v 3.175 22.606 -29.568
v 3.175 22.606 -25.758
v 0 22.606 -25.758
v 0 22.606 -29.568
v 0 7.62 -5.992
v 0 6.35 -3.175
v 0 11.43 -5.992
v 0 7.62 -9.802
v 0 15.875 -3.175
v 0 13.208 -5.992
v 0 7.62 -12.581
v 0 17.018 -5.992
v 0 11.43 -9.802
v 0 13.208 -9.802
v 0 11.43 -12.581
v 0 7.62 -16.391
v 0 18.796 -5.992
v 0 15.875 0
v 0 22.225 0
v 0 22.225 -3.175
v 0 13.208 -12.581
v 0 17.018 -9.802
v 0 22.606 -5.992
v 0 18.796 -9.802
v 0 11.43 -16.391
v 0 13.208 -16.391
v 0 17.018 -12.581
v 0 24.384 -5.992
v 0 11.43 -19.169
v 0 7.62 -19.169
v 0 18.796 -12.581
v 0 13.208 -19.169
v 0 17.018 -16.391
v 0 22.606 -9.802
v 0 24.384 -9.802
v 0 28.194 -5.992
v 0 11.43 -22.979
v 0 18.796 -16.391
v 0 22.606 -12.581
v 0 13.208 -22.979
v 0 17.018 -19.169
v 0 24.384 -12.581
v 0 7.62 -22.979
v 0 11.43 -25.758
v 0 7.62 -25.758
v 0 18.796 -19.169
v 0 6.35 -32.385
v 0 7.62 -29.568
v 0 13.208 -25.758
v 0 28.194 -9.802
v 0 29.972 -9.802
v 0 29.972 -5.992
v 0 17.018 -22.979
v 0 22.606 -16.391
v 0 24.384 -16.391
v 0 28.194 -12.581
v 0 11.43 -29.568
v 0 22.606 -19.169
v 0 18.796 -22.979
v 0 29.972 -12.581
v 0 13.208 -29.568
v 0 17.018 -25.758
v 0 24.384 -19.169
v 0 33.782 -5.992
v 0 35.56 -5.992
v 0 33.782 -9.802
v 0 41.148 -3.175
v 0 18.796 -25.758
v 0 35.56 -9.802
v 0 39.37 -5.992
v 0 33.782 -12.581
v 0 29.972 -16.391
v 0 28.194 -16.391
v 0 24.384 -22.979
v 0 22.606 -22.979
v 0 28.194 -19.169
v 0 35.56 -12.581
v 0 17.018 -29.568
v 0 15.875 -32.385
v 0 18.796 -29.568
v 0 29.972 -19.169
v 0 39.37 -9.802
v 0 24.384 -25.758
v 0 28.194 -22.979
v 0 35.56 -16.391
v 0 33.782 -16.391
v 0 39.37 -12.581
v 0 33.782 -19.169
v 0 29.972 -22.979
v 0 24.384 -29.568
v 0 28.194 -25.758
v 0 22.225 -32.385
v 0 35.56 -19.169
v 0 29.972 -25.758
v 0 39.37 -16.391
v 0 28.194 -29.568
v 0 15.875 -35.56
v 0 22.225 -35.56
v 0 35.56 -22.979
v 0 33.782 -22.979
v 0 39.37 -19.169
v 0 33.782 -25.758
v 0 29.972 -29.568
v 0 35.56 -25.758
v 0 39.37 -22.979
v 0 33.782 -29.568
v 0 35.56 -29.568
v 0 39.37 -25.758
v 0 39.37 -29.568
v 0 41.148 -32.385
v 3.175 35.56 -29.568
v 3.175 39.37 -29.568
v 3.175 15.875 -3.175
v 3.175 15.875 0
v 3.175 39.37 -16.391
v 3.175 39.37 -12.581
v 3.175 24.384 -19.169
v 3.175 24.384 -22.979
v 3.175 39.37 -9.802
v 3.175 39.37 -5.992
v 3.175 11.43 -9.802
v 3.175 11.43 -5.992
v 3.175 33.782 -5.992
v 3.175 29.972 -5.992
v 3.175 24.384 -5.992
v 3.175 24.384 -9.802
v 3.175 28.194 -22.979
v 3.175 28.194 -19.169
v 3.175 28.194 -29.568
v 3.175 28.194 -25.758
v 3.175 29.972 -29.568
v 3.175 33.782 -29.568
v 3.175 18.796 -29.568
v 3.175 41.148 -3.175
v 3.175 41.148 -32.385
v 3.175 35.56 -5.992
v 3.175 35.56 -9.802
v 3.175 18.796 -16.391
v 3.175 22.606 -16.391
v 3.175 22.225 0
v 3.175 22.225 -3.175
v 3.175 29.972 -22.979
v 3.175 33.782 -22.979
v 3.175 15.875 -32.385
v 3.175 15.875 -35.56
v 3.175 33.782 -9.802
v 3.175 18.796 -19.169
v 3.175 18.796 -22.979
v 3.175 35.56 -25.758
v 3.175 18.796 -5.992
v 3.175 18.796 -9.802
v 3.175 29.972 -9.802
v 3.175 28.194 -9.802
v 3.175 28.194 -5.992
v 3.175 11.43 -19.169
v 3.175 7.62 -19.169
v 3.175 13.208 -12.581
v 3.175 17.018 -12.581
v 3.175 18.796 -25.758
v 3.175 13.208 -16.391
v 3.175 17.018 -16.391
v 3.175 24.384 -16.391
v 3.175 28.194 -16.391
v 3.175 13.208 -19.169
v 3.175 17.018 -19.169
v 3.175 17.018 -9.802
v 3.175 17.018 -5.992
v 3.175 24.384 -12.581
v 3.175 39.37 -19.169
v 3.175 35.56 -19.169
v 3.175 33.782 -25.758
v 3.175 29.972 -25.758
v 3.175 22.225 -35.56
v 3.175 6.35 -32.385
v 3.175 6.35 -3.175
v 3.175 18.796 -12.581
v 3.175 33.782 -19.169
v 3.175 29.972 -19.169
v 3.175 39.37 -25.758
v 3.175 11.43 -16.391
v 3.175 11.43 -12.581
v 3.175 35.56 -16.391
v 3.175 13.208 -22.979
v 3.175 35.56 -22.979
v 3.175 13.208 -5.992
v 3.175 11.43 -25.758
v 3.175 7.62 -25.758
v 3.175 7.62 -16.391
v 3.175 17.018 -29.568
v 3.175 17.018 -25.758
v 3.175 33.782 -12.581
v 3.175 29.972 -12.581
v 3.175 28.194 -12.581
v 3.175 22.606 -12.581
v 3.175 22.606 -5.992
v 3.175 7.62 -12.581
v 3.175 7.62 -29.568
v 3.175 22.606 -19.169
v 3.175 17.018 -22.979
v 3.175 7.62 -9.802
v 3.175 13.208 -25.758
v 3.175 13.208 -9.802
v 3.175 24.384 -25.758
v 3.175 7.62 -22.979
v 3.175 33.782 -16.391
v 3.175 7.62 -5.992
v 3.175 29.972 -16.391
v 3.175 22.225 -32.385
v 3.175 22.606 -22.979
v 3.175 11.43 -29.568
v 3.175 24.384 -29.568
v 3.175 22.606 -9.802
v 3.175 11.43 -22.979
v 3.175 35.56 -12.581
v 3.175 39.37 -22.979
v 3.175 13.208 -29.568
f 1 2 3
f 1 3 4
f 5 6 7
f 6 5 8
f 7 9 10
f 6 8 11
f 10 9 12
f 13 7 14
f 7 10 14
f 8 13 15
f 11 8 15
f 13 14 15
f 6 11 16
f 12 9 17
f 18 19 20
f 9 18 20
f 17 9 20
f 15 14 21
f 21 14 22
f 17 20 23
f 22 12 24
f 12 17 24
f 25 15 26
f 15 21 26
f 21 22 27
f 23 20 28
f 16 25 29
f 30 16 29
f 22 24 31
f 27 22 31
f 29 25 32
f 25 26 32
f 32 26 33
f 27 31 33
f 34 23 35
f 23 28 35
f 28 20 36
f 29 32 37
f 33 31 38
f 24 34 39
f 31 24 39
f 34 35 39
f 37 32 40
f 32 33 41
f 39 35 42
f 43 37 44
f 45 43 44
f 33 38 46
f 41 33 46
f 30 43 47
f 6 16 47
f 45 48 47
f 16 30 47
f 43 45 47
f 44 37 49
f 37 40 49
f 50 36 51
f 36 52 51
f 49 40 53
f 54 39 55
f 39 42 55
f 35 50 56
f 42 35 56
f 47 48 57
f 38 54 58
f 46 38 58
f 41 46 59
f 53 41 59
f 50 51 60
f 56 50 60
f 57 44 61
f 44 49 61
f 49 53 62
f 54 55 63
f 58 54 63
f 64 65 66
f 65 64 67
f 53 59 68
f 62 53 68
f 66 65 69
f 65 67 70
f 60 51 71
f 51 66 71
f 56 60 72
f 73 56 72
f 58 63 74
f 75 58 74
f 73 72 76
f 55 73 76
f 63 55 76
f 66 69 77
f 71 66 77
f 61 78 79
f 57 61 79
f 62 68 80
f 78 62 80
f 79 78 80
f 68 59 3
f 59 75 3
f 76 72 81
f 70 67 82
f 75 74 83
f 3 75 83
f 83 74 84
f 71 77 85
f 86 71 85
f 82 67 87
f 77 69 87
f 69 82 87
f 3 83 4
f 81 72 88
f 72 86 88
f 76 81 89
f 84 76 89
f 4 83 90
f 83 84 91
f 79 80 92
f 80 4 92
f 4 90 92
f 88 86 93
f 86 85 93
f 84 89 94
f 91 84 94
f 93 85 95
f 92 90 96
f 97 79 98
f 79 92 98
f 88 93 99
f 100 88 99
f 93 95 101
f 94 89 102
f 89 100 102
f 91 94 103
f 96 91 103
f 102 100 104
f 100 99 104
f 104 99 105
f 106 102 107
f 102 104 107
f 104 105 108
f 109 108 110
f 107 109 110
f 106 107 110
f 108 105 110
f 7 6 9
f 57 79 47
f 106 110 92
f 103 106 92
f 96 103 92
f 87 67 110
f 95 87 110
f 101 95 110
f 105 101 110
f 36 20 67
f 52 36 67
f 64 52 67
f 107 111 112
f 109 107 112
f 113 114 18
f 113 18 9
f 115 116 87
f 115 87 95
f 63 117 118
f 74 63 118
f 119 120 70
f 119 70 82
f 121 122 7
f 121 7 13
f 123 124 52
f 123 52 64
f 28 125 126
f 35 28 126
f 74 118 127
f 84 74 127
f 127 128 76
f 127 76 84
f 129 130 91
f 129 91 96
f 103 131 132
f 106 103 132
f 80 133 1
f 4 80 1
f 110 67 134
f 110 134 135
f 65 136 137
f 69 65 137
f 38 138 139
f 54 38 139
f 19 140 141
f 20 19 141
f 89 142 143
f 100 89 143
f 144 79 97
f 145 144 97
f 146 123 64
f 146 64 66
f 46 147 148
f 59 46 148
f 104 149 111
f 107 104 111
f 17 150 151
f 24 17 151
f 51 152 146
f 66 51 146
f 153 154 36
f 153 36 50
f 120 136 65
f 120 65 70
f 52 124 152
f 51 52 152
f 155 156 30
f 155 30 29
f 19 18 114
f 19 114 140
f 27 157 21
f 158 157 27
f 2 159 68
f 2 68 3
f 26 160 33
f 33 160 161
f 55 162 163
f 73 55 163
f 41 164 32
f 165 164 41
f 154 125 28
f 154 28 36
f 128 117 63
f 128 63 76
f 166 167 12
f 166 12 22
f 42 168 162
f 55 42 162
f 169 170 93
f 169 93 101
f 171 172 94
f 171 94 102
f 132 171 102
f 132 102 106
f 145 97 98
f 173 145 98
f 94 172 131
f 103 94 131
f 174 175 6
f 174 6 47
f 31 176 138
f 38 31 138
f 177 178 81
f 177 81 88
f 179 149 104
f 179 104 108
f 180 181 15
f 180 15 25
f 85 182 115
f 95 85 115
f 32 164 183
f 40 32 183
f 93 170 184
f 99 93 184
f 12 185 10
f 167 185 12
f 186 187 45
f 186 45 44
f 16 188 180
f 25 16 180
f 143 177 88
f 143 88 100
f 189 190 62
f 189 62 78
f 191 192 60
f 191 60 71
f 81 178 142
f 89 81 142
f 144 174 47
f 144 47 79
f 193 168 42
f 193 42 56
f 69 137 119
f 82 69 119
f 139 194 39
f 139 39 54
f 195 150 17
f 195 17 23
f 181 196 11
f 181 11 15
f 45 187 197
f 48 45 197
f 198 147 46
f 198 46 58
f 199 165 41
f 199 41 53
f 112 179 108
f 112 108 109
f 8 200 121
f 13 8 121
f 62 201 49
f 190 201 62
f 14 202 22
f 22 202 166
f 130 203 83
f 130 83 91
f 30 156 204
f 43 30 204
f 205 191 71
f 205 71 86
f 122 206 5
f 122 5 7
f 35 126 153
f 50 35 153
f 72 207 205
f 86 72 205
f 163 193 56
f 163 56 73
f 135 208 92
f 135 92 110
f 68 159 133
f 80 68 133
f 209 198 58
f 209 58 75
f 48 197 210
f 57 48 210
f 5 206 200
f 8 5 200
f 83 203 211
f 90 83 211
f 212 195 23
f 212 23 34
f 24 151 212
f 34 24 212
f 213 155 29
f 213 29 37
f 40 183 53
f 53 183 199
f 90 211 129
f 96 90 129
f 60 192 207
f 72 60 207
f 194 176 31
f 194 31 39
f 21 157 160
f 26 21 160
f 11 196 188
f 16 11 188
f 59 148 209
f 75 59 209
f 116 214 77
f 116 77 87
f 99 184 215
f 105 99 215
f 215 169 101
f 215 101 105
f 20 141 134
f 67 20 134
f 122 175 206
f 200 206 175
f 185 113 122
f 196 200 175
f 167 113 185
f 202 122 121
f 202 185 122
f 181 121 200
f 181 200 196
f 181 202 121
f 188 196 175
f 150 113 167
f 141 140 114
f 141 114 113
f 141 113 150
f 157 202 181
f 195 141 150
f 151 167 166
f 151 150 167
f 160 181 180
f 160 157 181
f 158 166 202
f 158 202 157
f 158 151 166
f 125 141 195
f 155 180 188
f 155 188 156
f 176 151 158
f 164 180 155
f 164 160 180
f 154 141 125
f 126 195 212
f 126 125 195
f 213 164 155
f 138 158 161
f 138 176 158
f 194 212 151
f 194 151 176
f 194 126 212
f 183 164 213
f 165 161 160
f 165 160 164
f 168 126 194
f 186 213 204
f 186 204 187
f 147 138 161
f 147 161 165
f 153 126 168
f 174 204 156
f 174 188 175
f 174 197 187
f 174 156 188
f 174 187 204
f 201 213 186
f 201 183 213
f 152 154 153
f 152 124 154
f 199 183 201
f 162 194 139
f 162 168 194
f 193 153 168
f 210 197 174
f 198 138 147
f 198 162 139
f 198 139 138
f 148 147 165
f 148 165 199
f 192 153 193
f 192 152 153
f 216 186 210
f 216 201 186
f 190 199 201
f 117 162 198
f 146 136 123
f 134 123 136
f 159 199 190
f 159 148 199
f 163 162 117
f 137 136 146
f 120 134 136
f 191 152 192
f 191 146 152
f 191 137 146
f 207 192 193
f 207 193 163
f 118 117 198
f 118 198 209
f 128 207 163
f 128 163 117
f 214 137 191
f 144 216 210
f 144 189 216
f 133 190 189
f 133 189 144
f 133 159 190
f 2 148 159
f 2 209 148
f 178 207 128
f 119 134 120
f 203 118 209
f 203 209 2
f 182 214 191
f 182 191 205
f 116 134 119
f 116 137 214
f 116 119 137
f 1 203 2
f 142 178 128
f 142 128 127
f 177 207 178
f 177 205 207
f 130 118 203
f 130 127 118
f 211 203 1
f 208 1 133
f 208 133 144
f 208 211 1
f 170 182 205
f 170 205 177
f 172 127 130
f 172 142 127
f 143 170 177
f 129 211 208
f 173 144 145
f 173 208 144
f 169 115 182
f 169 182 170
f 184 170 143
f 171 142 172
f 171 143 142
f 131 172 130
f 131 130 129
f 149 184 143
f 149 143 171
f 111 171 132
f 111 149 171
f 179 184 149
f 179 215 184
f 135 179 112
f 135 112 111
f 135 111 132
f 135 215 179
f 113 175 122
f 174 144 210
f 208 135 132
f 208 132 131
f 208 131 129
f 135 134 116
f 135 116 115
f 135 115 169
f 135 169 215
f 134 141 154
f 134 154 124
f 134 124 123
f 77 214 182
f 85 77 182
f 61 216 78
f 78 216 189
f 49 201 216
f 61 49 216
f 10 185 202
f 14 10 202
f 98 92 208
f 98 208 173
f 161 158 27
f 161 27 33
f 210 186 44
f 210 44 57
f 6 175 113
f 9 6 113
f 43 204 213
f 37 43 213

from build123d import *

# Parameters (mm, degrees)
SKETCH1_W          = 35.56
SKETCH1_H          = 41.148
EXTRUDE1_DEPTH     = 3.175
SKETCH2_W          = 3.175
SKETCH2_H          = 18.923
SKETCH2_H_2        = 15.875
CUT_EXTRUDE3_DEPTH = 4.175
SKETCH3_W          = 29.21
SKETCH3_H          = 6.35
CUT_EXTRUDE4_DEPTH = 4.175
SKETCH4_W          = 3.81
SKETCH4_H          = 3.81
CUT_EXTRUDE5_DEPTH = 4.175


with BuildPart() as part:
    # Sketch1 → Extrude1 (new body)
    with BuildSketch(Plane(origin=(0, 0, 0), x_dir=(0, 0, -1), z_dir=(1, 0, 0))):
        with Locations((17.78, 20.574)):
            Rectangle(SKETCH1_W, SKETCH1_H)
    extrude(amount=EXTRUDE1_DEPTH)

    # Sketch2 → Cut-Extrude3 (cut, through all)
    with BuildSketch(Plane(origin=(3.175, 0, 0), x_dir=(0, 0, -1), z_dir=(1, 0, 0))):
        with Locations((1.5875, 31.6865)):
            Rectangle(SKETCH2_W, SKETCH2_H)
        with Locations((33.9725, 31.6865)):
            Rectangle(SKETCH2_W, SKETCH2_H)
        with Locations((33.9725, 7.9375)):
            Rectangle(SKETCH2_W, SKETCH2_H_2)
        with Locations((1.5875, 7.9375)):
            Rectangle(SKETCH2_W, SKETCH2_H_2)
    extrude(amount=-CUT_EXTRUDE3_DEPTH, mode=Mode.SUBTRACT)

    # Sketch3 → Cut-Extrude4 (cut, through all)
    with BuildSketch(Plane(origin=(3.175, 0, 0), x_dir=(0, 0, -1), z_dir=(1, 0, 0))):
        with Locations((17.78, 3.175)):
            Rectangle(SKETCH3_W, SKETCH3_H)
    extrude(amount=-CUT_EXTRUDE4_DEPTH, mode=Mode.SUBTRACT)

    # Sketch4 → Cut-Extrude5 (cut, through all)
    with BuildSketch(Plane(origin=(3.175, 0, 0), x_dir=(0, 0, -1), z_dir=(1, 0, 0))):
        with Locations((14.485579349, 9.525)):
            Rectangle(SKETCH4_W, SKETCH4_H)
        with Locations((7.896738046, 9.525)):
            Rectangle(SKETCH4_W, SKETCH4_H)
        with Locations((21.074420651, 9.525)):
            Rectangle(SKETCH4_W, SKETCH4_H)
        with Locations((27.663261954, 9.525)):
            Rectangle(SKETCH4_W, SKETCH4_H)
        with Locations((14.485579349, 15.113)):
            Rectangle(SKETCH4_W, SKETCH4_H)
        with Locations((7.896738046, 15.113)):
            Rectangle(SKETCH4_W, SKETCH4_H)
        with Locations((21.074420651, 15.113)):
            Rectangle(SKETCH4_W, SKETCH4_H)
        with Locations((27.663261954, 15.113)):
            Rectangle(SKETCH4_W, SKETCH4_H)
        with Locations((14.485579349, 20.701)):
            Rectangle(SKETCH4_W, SKETCH4_H)
        with Locations((7.896738046, 20.701)):
            Rectangle(SKETCH4_W, SKETCH4_H)
        with Locations((21.074420651, 20.701)):
            Rectangle(SKETCH4_W, SKETCH4_H)
        with Locations((27.663261954, 20.701)):
            Rectangle(SKETCH4_W, SKETCH4_H)
        with Locations((14.485579349, 26.289)):
            Rectangle(SKETCH4_W, SKETCH4_H)
        with Locations((7.896738046, 26.289)):
            Rectangle(SKETCH4_W, SKETCH4_H)
        with Locations((21.074420651, 26.289)):
            Rectangle(SKETCH4_W, SKETCH4_H)
        with Locations((27.663261954, 26.289)):
            Rectangle(SKETCH4_W, SKETCH4_H)
        with Locations((14.485579349, 31.877)):
            Rectangle(SKETCH4_W, SKETCH4_H)
        with Locations((7.896738046, 31.877)):
            Rectangle(SKETCH4_W, SKETCH4_H)
        with Locations((21.074420651, 31.877)):
            Rectangle(SKETCH4_W, SKETCH4_H)
        with Locations((27.663261954, 31.877)):
            Rectangle(SKETCH4_W, SKETCH4_H)
        with Locations((14.485579349, 37.465)):
            Rectangle(SKETCH4_W, SKETCH4_H)
        with Locations((7.896738046, 37.465)):
            Rectangle(SKETCH4_W, SKETCH4_H)
        with Locations((21.074420651, 37.465)):
            Rectangle(SKETCH4_W, SKETCH4_H)
        with Locations((27.663261954, 37.465)):
            Rectangle(SKETCH4_W, SKETCH4_H)
    extrude(amount=-CUT_EXTRUDE5_DEPTH, mode=Mode.SUBTRACT)


solid = part.part
